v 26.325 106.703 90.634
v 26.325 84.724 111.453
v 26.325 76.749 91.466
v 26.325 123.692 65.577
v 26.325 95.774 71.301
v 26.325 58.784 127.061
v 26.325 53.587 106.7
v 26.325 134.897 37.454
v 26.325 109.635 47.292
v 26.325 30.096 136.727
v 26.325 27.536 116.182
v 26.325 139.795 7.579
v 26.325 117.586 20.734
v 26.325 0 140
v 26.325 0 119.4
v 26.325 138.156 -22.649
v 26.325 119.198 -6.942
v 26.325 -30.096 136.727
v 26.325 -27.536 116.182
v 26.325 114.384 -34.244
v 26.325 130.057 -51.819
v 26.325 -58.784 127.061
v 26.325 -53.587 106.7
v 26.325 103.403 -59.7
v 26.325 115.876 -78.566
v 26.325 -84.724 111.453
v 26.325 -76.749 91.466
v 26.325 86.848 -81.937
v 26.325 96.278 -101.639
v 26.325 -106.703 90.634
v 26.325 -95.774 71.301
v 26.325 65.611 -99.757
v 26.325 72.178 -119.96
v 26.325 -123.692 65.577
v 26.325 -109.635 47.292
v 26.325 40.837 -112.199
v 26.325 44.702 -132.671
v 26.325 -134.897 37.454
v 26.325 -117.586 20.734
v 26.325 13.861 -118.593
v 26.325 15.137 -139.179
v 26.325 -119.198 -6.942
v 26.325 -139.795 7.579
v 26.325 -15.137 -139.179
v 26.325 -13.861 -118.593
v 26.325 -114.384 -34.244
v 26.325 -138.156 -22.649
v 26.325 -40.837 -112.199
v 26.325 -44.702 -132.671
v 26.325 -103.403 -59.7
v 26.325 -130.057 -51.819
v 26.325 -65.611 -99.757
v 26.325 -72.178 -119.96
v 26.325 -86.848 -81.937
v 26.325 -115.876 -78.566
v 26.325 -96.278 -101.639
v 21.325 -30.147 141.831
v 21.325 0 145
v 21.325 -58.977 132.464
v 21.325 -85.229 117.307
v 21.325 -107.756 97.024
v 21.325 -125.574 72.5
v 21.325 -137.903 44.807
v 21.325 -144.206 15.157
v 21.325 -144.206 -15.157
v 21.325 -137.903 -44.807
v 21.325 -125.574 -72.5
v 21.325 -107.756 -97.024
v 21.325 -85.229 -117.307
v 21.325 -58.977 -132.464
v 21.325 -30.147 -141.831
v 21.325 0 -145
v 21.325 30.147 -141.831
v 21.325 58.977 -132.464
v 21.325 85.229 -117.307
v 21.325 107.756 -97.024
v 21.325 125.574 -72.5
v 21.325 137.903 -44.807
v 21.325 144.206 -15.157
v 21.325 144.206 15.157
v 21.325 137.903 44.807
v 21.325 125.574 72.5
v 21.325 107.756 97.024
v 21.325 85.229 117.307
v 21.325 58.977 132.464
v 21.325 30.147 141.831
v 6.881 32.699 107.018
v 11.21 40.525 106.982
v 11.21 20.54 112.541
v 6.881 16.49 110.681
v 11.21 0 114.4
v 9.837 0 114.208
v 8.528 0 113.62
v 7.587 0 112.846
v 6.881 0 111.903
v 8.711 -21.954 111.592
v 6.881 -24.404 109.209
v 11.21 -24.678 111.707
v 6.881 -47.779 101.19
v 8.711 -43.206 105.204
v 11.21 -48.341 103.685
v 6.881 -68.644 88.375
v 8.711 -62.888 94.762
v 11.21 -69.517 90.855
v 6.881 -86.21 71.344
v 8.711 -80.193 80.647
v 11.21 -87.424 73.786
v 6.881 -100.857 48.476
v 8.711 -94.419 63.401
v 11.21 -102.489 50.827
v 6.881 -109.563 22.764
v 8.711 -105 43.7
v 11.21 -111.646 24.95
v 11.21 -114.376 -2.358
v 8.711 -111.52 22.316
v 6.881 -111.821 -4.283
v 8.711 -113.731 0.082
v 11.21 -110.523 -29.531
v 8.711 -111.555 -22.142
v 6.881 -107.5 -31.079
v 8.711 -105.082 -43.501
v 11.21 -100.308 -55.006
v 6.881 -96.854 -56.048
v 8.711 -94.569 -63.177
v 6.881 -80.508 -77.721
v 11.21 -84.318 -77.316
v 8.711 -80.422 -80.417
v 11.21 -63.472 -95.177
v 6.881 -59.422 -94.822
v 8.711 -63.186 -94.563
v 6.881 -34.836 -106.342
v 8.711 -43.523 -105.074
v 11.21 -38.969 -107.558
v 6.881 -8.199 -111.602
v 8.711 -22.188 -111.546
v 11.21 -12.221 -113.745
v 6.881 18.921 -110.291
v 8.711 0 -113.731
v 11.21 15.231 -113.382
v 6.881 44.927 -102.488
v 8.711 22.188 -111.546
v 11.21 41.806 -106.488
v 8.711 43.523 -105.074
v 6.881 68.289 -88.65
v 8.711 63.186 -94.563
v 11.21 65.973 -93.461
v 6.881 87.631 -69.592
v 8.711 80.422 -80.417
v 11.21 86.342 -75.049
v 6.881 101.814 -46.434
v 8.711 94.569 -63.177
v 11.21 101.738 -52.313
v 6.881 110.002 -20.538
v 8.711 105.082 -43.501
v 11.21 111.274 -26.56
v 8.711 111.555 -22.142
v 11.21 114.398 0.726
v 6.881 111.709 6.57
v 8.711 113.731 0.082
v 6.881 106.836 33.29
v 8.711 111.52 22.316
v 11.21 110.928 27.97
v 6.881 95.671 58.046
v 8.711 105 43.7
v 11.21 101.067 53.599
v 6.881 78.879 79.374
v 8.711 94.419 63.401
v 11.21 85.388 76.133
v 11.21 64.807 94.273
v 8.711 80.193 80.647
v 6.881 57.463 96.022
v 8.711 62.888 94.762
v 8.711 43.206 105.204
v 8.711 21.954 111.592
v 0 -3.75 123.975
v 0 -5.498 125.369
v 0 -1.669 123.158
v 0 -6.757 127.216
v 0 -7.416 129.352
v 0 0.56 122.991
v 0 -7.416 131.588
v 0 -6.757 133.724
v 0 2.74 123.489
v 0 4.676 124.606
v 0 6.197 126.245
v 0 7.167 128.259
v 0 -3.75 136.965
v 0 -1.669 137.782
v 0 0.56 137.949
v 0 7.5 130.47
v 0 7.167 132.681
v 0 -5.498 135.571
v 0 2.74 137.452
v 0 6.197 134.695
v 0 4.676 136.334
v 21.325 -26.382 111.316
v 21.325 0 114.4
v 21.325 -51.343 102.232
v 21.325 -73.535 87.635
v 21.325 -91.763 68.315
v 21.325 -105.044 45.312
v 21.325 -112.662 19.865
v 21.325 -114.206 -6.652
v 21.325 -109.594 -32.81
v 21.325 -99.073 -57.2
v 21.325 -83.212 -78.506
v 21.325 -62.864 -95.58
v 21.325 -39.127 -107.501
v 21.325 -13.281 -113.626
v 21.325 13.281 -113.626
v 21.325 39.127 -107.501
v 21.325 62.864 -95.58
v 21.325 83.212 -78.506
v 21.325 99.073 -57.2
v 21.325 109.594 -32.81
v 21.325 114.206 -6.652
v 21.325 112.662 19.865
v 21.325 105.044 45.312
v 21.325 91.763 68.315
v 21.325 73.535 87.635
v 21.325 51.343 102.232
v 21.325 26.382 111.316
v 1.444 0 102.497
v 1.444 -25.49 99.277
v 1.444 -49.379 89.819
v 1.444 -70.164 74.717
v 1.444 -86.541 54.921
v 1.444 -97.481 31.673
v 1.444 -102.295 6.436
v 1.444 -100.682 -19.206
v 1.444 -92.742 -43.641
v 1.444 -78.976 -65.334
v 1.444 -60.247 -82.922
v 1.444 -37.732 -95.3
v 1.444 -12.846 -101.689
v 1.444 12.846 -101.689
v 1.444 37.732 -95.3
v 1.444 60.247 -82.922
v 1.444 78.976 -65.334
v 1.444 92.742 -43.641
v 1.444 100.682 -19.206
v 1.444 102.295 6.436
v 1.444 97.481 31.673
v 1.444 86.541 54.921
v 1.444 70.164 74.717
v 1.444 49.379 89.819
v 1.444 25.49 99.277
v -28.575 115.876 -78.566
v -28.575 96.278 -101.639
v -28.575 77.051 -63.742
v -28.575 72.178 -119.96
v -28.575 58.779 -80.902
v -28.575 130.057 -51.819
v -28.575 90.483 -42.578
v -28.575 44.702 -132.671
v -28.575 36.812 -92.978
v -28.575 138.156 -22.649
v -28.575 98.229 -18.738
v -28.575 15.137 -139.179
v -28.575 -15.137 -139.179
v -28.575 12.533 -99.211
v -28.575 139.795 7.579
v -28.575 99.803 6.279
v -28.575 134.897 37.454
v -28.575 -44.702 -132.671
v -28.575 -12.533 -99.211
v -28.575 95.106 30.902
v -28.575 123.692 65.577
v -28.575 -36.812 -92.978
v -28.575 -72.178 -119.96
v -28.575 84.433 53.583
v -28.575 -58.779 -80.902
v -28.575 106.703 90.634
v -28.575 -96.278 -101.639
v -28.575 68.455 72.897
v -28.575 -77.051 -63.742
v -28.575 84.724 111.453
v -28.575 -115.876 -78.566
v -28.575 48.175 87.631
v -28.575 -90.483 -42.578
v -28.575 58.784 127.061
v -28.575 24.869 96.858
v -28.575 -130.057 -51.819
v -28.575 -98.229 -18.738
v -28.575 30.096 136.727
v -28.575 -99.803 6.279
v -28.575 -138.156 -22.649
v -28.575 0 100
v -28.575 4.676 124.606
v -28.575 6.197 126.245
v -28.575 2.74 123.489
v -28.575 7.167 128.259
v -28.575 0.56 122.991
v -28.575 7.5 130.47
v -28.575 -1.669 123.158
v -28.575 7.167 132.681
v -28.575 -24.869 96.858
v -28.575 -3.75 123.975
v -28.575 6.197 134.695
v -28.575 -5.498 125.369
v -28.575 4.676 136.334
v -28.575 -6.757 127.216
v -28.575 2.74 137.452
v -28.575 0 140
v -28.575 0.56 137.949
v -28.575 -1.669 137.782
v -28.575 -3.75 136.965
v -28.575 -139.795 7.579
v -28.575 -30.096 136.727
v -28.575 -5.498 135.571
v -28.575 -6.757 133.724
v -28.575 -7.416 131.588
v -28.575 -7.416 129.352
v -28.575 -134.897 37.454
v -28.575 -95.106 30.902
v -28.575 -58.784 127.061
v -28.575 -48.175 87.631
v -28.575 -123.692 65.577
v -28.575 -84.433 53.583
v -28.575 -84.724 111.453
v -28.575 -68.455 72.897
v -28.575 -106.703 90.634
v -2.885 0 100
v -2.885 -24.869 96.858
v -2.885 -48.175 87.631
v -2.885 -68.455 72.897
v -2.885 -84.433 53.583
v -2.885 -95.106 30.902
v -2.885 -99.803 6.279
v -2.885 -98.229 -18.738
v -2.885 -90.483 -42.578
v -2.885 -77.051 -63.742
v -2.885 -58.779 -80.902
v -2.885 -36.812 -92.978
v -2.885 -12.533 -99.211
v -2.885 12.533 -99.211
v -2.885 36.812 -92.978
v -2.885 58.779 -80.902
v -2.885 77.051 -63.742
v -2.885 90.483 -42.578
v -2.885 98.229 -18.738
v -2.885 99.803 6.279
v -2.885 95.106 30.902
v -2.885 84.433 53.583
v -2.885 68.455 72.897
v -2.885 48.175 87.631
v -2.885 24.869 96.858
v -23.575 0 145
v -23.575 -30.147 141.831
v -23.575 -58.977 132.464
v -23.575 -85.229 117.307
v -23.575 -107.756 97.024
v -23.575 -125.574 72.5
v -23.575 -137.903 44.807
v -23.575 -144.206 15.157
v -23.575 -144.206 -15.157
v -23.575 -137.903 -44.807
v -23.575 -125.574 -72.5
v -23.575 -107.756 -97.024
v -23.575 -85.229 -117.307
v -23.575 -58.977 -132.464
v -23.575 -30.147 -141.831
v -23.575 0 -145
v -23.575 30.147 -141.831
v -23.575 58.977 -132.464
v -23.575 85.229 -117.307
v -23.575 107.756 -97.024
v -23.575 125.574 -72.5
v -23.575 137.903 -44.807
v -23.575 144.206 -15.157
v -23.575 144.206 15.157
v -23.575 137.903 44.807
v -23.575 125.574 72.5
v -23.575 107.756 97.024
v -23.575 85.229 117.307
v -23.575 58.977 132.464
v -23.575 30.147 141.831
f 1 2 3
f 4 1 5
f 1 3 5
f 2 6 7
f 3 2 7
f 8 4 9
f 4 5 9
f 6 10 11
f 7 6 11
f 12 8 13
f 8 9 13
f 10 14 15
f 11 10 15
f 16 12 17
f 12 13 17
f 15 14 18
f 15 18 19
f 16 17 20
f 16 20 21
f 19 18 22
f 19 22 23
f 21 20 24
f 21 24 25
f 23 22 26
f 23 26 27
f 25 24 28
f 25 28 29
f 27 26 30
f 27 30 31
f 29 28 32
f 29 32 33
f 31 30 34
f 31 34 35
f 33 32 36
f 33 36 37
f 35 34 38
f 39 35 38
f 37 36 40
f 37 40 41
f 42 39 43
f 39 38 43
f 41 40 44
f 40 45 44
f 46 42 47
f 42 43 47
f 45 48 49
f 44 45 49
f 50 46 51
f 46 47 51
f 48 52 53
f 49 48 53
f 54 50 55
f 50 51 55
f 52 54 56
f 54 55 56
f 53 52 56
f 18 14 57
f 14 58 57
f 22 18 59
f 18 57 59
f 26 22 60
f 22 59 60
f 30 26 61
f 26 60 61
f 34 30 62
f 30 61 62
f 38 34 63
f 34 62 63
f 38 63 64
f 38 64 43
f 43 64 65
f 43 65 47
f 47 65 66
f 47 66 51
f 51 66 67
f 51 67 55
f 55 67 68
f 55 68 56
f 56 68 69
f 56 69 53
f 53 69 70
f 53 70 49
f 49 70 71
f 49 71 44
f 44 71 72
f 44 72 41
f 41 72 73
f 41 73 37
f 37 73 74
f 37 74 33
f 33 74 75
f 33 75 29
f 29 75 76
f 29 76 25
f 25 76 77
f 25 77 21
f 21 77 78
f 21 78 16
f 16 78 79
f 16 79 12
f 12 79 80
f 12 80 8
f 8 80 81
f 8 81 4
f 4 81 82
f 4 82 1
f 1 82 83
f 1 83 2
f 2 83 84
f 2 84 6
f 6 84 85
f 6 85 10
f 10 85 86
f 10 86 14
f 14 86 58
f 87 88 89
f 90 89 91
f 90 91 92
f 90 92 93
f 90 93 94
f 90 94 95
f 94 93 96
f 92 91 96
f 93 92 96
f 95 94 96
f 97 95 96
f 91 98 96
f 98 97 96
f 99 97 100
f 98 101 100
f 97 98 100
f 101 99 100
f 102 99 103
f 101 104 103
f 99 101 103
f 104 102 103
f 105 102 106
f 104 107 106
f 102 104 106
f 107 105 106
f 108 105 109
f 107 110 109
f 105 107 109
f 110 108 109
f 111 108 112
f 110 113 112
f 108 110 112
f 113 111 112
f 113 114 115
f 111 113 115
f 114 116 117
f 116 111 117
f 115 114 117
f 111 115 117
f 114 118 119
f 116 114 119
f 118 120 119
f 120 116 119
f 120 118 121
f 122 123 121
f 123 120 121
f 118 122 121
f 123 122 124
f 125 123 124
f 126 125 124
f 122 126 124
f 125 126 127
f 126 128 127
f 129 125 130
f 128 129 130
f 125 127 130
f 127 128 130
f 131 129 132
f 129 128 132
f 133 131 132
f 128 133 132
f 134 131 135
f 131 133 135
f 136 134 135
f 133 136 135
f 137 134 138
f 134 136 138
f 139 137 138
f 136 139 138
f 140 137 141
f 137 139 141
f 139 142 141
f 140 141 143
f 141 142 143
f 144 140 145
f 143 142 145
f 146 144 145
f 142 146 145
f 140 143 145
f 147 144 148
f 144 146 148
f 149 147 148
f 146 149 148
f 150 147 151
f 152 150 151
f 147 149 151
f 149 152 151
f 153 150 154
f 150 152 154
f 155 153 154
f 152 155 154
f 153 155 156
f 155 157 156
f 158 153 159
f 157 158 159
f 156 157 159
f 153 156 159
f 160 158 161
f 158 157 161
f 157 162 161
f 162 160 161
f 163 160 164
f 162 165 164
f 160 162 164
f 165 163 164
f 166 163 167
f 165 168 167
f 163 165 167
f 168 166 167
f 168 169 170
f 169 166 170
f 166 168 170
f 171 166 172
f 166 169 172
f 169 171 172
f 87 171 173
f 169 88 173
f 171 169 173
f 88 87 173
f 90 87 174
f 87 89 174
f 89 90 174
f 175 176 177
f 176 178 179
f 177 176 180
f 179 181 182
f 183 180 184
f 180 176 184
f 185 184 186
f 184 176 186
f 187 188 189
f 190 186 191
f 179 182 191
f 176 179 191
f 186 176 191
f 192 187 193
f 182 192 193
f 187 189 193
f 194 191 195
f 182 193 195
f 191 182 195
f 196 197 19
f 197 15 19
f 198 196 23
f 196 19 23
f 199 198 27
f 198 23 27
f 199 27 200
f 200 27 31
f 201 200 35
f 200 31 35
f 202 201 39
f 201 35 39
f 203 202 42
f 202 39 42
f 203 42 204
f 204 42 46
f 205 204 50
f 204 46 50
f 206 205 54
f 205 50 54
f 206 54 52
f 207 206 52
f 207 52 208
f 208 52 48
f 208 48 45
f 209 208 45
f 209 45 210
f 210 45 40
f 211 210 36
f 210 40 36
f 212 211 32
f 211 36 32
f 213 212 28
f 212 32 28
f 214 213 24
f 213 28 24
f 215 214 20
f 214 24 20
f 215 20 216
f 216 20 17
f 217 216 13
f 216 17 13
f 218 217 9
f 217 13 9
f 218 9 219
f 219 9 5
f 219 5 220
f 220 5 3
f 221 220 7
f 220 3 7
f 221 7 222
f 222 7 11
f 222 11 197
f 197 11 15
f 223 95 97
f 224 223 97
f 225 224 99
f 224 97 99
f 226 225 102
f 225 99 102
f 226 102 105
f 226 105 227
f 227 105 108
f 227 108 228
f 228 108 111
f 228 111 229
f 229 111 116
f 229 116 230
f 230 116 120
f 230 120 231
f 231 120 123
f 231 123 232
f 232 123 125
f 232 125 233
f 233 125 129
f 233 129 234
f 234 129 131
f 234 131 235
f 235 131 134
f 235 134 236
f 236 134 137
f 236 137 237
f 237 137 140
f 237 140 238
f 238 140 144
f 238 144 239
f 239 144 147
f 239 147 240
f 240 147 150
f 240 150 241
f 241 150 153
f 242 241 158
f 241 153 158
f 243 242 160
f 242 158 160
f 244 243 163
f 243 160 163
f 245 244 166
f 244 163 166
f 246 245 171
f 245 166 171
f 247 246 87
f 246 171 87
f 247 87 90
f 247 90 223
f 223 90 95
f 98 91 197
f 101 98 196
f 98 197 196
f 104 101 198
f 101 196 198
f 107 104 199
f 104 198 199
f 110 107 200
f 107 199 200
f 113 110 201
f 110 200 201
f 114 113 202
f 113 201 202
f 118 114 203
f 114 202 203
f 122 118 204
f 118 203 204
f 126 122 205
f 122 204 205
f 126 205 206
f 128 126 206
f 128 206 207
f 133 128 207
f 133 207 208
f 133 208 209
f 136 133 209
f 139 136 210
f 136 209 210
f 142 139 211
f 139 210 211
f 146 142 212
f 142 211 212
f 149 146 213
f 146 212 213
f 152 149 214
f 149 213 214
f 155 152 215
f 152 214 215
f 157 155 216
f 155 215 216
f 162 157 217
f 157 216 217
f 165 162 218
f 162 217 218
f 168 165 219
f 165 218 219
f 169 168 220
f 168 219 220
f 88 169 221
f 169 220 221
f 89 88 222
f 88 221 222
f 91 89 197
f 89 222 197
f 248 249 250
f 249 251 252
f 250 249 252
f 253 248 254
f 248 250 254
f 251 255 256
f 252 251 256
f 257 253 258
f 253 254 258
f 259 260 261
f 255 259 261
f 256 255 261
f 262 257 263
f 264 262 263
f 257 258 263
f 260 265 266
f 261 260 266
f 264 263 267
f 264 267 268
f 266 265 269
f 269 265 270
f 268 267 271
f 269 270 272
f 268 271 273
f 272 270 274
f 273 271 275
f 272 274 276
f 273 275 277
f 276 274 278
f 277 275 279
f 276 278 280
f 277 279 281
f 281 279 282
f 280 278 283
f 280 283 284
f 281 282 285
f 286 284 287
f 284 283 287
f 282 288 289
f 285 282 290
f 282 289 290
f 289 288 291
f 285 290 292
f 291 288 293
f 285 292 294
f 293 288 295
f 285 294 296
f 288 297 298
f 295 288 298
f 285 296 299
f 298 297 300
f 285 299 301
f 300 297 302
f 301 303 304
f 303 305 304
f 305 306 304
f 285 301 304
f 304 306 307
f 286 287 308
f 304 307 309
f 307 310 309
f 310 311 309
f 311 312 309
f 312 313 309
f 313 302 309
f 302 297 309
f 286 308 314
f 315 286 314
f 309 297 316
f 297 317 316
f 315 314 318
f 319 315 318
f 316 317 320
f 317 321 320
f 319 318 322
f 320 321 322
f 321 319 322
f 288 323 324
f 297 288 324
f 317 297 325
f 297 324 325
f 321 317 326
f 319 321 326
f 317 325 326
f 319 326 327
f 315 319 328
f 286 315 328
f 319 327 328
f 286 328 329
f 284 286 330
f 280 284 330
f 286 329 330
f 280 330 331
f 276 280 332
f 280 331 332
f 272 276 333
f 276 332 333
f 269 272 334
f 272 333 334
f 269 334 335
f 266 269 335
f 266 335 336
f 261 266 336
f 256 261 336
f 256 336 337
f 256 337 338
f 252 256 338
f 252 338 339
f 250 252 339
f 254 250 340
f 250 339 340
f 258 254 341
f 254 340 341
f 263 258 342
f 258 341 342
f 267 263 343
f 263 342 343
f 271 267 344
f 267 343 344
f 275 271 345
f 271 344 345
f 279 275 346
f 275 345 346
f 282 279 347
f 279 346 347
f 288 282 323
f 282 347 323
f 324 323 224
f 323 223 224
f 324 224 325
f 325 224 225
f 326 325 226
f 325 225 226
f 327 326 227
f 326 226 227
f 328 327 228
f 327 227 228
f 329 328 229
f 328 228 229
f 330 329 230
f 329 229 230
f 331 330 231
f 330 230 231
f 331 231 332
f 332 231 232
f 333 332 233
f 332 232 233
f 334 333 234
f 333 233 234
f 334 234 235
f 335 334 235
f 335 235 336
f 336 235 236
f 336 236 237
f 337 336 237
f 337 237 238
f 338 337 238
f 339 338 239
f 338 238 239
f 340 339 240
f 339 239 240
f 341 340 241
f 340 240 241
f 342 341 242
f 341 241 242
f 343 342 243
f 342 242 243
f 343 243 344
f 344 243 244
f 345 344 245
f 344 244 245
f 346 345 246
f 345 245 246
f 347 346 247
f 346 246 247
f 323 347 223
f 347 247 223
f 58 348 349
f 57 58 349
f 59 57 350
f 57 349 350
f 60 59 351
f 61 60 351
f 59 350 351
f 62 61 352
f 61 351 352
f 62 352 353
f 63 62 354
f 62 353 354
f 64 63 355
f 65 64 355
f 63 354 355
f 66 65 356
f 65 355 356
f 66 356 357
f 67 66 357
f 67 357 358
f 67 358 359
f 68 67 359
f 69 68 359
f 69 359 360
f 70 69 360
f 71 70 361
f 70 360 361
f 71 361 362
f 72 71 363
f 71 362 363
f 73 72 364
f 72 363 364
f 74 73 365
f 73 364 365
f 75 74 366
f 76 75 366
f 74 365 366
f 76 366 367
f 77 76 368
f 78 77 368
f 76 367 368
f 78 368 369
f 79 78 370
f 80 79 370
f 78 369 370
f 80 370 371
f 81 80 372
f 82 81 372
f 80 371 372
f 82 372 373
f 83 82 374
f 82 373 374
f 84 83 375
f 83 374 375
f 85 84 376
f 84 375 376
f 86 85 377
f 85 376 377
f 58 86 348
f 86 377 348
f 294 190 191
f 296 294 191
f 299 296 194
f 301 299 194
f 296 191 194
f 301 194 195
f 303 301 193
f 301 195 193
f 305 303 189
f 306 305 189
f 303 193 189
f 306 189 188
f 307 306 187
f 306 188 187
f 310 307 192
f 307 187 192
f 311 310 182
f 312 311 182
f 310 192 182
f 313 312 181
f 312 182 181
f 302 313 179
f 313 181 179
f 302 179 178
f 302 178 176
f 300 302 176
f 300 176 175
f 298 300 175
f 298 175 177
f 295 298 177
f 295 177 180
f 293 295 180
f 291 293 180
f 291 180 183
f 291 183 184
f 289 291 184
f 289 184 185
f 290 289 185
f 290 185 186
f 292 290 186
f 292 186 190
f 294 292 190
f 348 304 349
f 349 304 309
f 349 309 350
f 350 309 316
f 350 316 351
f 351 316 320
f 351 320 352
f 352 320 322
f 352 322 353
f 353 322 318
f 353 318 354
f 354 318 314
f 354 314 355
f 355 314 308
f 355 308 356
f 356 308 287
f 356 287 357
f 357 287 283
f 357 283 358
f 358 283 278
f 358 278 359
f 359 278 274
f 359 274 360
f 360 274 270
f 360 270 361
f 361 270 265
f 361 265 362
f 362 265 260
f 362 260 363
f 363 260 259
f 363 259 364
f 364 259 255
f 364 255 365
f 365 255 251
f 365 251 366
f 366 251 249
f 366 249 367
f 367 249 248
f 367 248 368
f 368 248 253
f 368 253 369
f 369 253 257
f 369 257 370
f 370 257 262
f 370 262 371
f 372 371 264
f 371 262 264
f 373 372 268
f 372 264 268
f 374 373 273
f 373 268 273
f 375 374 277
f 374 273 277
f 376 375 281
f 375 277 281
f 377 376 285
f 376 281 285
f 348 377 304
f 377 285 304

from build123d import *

# Parameters (mm, degrees)
F3_R     = 5
F5_D     = 15
F5_DEPTH = 28.576000561


# Not quite as in the source:
# - a fillet or chamfer that OpenCascade refuses, or shapes differently, is made with other operations: its cross-section is extruded or revolved along the edge and cut away or added


with BuildPart() as f1:
    # F0 (on Front) → F1 (revolve)
    with BuildSketch(Plane.XZ):
        Polygon((26.3250011413, 145), (-27.2249993616, 145), (-28.575000561, 145), (-28.575000561, 100), (0, 100), (8.3250019151, 114.3999986072), (26.3250011413, 114.3999986072), align=None)
    revolve(axis=Axis((-1.3500031339, 0, 0), (1, 0, 0)))

    # F2: chamfer of 5 on 4 edges, made by hand

    # F2_s1 → F2_t2 (revolve, cut)
    with BuildSketch(Plane.XZ):
        Polygon((26.3250011413, 140), (21.3250011413, 145), (26.3250011413, 145), align=None)
    revolve(axis=Axis((26.3250011413, 0, 0), (1, 0, 0)), mode=Mode.SUBTRACT)

    # F2_s3 → F2_t4 (revolve, cut)
    with BuildSketch(Plane.XZ):
        Polygon((21.3250011413, 114.3999986072), (26.3250011413, 119.3999986072), (26.3250011413, 114.3999986072), align=None)
    revolve(axis=Axis((26.3250011413, 0, 0), (1, 0, 0)), mode=Mode.SUBTRACT)

    # F2_s5 → F2_t6 (revolve, cut)
    with BuildSketch(Plane.XZ):
        Polygon((-2.8848150214, 100), (1.4438587798, 102.4974846409), (0, 100), align=None)
    revolve(axis=Axis((0, 0, 0), (1, 0, 0)), mode=Mode.SUBTRACT)

    # F2_s7 → F2_t8 (revolve, cut)
    with BuildSketch(Plane.XZ):
        Polygon((-23.575000561, 145), (-28.575000561, 140), (-28.575000561, 145), align=None)
    revolve(axis=Axis((-28.575000561, 0, 0), (1, 0, 0)), mode=Mode.SUBTRACT)

    # F3
    f3_edges = [f1.edges().sort_by_distance(p)[0] for p in [
        (8.325002, 0, -114.399999),
    ]]
    fillet(f3_edges, radius=F3_R)

    # F5 (through all, one way)
    with BuildSketch(Plane.YZ):
        with Locations((0, 130.4700821638)):
            Circle(F5_D / 2)
    extrude(amount=-F5_DEPTH, mode=Mode.SUBTRACT)


solid = f1.part
